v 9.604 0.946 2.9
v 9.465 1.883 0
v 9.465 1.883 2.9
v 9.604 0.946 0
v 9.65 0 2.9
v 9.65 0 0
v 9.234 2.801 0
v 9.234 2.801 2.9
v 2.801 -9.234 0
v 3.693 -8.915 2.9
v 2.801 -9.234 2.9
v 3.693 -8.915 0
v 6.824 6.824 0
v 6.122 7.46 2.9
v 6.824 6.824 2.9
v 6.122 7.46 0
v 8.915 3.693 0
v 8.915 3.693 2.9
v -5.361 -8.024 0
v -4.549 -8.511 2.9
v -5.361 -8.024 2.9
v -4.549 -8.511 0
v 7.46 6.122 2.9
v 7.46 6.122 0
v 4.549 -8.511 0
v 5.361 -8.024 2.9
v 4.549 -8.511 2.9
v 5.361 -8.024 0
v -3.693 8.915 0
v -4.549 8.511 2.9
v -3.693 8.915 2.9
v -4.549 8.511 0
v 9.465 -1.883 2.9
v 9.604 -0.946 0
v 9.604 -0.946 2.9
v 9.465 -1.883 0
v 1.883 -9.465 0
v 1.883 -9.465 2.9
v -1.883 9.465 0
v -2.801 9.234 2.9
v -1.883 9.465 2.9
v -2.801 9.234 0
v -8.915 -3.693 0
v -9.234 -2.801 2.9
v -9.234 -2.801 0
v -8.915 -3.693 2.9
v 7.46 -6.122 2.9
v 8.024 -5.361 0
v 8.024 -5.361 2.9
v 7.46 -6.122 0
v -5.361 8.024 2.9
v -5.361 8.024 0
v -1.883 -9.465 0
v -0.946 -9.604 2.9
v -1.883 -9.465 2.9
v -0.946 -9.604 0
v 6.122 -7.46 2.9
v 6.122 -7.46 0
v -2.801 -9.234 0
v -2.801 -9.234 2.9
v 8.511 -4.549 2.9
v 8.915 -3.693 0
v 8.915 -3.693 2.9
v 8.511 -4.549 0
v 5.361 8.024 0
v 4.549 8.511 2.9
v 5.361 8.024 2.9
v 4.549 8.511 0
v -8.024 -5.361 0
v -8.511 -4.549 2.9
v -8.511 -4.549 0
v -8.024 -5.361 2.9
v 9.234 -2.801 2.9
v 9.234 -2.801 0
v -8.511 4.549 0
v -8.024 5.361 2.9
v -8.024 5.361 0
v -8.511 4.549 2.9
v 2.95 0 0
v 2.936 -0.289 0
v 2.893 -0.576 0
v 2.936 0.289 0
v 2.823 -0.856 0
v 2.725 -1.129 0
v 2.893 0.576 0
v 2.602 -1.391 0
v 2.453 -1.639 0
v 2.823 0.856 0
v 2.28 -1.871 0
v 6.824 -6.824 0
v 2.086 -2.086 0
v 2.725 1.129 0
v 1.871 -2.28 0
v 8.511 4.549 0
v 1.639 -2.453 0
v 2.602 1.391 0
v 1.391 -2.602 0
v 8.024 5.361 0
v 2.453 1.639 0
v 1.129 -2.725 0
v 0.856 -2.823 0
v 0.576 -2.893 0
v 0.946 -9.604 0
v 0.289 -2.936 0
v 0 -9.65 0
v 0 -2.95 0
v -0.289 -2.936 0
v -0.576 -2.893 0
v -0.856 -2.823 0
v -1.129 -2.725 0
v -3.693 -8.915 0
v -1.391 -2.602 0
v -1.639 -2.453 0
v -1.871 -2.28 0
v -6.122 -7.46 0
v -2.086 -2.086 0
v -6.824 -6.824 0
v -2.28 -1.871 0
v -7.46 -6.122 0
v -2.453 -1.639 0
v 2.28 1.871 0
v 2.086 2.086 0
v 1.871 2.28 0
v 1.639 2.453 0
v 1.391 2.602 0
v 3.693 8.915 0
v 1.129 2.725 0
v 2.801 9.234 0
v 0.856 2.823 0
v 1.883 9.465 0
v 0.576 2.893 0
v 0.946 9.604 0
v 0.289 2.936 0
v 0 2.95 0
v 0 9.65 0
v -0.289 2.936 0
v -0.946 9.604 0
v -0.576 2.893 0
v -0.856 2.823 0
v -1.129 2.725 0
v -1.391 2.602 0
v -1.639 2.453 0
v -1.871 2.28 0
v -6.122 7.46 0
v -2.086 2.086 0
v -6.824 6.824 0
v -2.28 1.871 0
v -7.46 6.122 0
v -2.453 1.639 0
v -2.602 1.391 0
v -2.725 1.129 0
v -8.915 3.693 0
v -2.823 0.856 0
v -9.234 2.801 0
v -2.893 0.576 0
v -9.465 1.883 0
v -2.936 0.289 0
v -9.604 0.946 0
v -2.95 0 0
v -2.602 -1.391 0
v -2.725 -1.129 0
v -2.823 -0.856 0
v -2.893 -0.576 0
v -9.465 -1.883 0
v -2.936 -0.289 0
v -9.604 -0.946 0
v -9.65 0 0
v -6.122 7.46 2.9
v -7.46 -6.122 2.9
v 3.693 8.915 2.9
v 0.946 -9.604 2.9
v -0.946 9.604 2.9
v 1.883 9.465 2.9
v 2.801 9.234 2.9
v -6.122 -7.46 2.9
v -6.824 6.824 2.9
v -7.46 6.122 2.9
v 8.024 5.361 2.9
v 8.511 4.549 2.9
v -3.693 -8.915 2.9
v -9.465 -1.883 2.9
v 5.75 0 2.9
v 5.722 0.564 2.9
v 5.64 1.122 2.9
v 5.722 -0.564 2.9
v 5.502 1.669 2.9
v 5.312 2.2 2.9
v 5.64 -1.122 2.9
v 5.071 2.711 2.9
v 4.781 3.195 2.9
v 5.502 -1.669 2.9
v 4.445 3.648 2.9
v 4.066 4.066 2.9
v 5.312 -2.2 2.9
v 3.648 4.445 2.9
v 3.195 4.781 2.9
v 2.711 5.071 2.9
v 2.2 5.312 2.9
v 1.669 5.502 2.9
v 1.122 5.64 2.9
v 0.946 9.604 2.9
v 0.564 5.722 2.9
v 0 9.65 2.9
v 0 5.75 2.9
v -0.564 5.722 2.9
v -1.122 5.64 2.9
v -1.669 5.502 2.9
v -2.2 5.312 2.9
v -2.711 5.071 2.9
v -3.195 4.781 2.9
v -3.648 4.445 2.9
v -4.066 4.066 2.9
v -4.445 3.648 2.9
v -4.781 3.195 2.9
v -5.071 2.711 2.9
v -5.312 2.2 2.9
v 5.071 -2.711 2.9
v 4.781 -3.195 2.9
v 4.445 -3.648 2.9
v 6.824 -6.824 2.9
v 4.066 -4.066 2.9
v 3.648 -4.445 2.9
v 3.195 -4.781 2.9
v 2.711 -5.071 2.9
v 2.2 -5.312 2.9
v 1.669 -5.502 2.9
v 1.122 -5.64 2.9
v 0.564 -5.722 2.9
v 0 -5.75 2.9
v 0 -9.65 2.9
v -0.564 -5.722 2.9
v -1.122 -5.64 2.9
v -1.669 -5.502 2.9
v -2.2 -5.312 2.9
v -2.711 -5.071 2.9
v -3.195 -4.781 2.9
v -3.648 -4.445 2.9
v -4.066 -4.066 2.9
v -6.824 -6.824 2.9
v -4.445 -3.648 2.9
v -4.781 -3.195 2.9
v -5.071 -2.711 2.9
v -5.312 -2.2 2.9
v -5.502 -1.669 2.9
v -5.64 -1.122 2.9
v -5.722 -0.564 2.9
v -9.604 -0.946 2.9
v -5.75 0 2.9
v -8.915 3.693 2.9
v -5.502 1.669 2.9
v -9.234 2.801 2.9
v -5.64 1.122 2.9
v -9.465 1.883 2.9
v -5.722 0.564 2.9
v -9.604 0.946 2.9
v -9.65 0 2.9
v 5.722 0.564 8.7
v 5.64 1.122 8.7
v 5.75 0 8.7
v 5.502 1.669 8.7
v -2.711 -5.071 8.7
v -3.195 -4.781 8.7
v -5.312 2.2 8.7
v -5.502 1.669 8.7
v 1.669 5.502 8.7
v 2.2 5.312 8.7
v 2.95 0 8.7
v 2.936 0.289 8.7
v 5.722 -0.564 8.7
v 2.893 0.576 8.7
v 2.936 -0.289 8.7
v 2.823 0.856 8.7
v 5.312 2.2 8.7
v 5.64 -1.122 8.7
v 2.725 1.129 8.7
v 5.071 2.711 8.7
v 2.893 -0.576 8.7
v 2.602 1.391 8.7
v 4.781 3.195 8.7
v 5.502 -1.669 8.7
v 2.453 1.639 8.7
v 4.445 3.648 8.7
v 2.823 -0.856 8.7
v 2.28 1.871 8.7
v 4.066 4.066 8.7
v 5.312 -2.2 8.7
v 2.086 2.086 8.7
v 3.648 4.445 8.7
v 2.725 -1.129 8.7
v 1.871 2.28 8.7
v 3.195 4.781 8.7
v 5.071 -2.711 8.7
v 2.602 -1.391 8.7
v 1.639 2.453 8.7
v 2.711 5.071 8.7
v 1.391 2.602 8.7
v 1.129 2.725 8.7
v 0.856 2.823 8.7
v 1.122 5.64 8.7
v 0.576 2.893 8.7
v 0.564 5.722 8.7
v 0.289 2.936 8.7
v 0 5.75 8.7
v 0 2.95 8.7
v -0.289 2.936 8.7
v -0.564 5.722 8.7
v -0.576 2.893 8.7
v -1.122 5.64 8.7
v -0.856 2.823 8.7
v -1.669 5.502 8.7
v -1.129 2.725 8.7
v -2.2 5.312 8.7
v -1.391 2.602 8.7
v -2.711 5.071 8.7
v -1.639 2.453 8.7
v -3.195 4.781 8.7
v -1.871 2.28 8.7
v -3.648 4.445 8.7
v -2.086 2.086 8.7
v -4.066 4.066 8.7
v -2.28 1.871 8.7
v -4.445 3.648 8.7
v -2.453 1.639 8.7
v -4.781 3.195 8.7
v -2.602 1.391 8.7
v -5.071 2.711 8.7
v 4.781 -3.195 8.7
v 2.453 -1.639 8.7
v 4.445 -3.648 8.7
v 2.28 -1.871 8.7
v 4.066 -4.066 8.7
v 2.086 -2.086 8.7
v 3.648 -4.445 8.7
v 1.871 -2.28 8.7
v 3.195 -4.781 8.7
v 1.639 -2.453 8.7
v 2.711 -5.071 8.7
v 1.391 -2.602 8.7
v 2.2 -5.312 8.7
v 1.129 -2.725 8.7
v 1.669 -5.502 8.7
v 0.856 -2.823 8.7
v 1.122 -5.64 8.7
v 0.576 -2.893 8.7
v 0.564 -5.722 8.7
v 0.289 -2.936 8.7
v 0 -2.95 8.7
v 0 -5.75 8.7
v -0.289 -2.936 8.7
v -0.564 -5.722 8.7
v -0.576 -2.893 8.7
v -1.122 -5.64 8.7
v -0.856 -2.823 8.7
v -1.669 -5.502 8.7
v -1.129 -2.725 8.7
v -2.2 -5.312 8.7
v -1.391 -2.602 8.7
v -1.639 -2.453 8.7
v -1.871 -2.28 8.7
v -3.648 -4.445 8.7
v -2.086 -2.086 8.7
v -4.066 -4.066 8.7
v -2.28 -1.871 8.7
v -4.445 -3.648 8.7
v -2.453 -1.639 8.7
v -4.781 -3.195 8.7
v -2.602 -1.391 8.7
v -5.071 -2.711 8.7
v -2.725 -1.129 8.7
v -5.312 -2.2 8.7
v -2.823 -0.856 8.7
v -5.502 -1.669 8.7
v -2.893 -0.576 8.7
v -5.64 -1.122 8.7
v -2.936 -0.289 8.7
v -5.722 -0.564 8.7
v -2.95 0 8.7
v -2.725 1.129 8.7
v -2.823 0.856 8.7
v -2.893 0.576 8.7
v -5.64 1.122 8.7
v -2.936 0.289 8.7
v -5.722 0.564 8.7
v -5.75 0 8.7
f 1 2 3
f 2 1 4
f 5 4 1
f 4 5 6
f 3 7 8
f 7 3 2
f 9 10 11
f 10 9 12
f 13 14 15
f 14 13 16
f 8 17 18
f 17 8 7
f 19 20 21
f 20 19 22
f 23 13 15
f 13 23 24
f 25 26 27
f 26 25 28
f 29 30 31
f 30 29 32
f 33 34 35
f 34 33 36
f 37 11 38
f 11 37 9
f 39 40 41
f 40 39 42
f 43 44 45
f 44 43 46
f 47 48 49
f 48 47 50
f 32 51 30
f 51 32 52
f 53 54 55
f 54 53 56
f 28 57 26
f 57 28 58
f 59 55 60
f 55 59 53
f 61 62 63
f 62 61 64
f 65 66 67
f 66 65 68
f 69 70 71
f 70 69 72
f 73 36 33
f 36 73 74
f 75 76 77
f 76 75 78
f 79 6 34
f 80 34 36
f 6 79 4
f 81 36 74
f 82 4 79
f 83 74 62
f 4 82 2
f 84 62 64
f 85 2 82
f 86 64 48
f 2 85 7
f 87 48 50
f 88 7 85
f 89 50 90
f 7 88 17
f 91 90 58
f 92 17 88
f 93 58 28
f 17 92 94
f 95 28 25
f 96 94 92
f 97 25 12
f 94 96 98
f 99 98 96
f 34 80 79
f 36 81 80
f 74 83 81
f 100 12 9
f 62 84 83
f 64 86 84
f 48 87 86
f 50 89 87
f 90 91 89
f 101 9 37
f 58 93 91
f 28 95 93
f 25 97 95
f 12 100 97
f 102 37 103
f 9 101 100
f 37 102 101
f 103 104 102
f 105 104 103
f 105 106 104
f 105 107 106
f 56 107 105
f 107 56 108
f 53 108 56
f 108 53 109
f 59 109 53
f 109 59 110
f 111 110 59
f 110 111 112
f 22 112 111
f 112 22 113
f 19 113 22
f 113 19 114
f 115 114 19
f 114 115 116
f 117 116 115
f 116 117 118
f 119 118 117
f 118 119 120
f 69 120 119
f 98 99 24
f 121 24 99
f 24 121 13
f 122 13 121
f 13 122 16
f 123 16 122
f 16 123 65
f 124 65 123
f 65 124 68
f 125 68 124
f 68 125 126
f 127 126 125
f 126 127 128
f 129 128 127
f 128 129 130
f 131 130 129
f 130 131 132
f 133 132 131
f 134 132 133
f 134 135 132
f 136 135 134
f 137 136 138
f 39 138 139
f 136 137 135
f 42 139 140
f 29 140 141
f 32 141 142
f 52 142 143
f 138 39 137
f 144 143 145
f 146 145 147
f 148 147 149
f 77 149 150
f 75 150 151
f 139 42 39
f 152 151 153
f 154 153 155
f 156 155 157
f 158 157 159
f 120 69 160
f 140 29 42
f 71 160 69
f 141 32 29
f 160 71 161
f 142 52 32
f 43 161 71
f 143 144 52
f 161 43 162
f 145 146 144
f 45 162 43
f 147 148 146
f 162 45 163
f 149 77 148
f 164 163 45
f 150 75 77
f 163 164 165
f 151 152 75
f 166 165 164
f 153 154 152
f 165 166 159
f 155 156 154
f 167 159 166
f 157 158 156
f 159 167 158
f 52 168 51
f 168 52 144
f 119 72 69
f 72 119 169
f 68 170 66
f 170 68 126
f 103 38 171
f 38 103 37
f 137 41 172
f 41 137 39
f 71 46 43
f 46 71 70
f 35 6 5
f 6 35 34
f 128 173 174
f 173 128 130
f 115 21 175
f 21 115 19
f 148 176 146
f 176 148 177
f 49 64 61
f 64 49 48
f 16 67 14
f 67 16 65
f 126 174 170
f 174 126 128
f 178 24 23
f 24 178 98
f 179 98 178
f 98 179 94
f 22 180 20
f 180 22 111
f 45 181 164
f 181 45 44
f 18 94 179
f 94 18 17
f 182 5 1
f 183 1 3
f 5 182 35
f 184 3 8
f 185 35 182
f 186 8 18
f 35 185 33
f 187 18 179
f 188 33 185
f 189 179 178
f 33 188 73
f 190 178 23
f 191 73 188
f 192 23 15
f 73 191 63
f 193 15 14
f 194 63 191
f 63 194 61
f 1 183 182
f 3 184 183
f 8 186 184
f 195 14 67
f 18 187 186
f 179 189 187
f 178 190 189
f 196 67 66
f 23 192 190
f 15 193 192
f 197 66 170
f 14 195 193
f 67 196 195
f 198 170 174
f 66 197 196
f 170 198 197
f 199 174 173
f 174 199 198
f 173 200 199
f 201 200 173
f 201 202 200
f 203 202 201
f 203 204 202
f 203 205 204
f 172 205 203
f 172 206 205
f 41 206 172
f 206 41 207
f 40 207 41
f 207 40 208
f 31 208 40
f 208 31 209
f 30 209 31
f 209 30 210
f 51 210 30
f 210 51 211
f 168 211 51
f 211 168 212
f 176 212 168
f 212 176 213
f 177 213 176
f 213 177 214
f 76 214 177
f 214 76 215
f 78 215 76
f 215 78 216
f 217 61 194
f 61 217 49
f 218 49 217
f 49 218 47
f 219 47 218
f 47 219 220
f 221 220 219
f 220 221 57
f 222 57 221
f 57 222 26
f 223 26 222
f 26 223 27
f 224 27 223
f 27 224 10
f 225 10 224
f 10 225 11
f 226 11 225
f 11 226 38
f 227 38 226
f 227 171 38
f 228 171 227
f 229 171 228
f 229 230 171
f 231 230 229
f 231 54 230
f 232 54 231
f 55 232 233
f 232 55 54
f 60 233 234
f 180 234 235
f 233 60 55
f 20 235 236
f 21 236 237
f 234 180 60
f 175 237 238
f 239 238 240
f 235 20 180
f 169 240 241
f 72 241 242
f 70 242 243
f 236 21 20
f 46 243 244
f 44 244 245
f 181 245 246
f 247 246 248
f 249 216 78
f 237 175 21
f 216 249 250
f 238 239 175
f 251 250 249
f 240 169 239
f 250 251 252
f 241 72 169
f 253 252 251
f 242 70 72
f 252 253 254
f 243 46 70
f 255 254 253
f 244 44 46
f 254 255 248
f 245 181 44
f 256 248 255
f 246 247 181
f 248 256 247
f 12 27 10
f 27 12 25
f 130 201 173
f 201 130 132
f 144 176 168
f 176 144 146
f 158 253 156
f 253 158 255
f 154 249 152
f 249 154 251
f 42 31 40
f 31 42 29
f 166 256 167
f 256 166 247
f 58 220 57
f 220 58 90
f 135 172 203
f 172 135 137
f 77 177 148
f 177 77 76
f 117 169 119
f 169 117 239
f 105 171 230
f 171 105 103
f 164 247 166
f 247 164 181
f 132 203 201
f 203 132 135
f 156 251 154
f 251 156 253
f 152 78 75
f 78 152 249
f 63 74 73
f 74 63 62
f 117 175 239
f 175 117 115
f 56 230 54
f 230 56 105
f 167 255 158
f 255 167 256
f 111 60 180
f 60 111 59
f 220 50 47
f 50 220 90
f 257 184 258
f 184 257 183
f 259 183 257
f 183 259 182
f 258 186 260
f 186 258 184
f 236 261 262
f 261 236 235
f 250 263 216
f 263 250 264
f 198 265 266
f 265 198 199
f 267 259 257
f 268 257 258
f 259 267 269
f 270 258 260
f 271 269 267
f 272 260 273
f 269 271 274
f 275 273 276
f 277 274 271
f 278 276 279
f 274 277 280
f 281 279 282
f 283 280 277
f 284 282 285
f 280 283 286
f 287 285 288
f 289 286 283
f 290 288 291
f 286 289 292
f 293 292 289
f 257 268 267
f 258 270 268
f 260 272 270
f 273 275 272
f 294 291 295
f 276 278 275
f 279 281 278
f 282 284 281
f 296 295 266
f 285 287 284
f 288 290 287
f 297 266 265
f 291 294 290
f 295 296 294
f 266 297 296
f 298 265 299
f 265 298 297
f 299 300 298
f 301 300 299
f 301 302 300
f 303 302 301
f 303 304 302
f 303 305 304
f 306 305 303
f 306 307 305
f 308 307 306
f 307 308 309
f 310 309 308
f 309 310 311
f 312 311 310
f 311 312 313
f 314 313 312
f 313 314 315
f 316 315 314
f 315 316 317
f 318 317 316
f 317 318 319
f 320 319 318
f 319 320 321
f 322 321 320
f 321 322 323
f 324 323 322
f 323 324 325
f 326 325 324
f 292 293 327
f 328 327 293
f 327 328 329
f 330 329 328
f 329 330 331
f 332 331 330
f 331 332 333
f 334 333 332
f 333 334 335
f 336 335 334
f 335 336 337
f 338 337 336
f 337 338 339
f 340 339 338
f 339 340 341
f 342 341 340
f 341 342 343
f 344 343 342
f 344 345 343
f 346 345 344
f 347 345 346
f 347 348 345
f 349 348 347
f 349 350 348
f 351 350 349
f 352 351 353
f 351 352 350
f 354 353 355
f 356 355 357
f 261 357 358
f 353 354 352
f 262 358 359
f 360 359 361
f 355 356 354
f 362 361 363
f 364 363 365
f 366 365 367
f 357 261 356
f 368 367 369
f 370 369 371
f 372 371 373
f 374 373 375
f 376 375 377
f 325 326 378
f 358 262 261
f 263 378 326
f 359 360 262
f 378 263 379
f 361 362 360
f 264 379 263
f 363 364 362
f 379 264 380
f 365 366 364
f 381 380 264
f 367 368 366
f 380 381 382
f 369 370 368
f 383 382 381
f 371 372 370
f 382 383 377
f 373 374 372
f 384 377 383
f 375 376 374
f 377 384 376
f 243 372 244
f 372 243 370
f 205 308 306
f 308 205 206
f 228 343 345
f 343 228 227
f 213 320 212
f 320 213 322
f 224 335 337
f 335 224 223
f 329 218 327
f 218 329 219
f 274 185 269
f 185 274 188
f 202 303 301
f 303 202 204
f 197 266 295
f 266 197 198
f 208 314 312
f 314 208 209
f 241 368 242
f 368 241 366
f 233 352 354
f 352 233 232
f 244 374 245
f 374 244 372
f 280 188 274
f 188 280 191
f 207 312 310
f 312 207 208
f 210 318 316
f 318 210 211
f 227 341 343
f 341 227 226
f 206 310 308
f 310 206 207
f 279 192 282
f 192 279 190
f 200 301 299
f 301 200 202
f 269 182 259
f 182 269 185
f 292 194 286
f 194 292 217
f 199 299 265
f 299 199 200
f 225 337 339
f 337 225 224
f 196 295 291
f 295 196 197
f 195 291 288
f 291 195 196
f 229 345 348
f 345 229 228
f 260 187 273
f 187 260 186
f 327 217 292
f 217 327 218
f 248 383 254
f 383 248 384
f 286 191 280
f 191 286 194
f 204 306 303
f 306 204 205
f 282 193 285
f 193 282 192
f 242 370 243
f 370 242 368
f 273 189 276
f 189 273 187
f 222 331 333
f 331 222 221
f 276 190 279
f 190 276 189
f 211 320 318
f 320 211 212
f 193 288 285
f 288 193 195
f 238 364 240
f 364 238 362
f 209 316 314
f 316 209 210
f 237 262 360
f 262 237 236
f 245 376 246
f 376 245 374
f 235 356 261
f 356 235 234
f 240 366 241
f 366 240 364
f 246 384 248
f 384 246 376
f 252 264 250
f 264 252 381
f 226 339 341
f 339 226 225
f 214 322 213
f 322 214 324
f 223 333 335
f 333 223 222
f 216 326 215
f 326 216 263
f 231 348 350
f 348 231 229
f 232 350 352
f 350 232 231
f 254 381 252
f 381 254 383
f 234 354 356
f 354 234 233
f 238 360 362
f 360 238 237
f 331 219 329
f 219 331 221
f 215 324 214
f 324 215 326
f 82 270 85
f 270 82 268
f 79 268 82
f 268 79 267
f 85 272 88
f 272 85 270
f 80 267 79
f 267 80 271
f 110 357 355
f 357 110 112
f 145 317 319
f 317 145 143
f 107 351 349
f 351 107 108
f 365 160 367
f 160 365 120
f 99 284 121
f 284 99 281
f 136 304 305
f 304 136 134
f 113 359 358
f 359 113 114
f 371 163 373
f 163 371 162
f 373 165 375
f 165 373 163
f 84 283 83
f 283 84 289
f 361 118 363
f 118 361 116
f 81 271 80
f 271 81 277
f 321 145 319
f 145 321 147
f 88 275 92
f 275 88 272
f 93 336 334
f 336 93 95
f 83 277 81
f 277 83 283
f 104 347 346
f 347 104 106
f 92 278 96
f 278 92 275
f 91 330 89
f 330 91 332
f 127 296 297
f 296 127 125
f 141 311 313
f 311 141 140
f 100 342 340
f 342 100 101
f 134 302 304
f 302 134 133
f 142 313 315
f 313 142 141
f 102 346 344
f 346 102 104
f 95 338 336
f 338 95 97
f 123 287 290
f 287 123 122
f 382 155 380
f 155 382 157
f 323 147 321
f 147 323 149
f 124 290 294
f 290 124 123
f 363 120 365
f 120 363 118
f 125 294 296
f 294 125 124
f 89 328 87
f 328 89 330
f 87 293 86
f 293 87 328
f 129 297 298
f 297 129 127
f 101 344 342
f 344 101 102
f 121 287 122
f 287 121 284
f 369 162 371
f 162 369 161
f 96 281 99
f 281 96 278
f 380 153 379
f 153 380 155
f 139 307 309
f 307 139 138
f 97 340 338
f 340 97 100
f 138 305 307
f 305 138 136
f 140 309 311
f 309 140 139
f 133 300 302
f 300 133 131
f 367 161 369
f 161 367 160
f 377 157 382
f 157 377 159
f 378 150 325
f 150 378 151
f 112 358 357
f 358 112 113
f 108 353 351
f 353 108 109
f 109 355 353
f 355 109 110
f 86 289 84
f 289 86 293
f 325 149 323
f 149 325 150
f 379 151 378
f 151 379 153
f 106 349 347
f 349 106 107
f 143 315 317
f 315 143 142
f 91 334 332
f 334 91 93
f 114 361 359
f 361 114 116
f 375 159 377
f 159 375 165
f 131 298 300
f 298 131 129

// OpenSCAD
// Global constants
$fn=64;

// Parameters
INNER_HOLE_DELTA = 0.2 * 2;

detail();

module detail() {
    difference() {
        union() {  
            cylinder(r=19.3 / 2, h=2.9);    
            translate([0, 0, 2.9])
                cylinder(r=11.5 / 2, h=5.8);
        }
        cylinder(r=(5.5 + INNER_HOLE_DELTA) / 2, h=8.7);    
    }
    
}
